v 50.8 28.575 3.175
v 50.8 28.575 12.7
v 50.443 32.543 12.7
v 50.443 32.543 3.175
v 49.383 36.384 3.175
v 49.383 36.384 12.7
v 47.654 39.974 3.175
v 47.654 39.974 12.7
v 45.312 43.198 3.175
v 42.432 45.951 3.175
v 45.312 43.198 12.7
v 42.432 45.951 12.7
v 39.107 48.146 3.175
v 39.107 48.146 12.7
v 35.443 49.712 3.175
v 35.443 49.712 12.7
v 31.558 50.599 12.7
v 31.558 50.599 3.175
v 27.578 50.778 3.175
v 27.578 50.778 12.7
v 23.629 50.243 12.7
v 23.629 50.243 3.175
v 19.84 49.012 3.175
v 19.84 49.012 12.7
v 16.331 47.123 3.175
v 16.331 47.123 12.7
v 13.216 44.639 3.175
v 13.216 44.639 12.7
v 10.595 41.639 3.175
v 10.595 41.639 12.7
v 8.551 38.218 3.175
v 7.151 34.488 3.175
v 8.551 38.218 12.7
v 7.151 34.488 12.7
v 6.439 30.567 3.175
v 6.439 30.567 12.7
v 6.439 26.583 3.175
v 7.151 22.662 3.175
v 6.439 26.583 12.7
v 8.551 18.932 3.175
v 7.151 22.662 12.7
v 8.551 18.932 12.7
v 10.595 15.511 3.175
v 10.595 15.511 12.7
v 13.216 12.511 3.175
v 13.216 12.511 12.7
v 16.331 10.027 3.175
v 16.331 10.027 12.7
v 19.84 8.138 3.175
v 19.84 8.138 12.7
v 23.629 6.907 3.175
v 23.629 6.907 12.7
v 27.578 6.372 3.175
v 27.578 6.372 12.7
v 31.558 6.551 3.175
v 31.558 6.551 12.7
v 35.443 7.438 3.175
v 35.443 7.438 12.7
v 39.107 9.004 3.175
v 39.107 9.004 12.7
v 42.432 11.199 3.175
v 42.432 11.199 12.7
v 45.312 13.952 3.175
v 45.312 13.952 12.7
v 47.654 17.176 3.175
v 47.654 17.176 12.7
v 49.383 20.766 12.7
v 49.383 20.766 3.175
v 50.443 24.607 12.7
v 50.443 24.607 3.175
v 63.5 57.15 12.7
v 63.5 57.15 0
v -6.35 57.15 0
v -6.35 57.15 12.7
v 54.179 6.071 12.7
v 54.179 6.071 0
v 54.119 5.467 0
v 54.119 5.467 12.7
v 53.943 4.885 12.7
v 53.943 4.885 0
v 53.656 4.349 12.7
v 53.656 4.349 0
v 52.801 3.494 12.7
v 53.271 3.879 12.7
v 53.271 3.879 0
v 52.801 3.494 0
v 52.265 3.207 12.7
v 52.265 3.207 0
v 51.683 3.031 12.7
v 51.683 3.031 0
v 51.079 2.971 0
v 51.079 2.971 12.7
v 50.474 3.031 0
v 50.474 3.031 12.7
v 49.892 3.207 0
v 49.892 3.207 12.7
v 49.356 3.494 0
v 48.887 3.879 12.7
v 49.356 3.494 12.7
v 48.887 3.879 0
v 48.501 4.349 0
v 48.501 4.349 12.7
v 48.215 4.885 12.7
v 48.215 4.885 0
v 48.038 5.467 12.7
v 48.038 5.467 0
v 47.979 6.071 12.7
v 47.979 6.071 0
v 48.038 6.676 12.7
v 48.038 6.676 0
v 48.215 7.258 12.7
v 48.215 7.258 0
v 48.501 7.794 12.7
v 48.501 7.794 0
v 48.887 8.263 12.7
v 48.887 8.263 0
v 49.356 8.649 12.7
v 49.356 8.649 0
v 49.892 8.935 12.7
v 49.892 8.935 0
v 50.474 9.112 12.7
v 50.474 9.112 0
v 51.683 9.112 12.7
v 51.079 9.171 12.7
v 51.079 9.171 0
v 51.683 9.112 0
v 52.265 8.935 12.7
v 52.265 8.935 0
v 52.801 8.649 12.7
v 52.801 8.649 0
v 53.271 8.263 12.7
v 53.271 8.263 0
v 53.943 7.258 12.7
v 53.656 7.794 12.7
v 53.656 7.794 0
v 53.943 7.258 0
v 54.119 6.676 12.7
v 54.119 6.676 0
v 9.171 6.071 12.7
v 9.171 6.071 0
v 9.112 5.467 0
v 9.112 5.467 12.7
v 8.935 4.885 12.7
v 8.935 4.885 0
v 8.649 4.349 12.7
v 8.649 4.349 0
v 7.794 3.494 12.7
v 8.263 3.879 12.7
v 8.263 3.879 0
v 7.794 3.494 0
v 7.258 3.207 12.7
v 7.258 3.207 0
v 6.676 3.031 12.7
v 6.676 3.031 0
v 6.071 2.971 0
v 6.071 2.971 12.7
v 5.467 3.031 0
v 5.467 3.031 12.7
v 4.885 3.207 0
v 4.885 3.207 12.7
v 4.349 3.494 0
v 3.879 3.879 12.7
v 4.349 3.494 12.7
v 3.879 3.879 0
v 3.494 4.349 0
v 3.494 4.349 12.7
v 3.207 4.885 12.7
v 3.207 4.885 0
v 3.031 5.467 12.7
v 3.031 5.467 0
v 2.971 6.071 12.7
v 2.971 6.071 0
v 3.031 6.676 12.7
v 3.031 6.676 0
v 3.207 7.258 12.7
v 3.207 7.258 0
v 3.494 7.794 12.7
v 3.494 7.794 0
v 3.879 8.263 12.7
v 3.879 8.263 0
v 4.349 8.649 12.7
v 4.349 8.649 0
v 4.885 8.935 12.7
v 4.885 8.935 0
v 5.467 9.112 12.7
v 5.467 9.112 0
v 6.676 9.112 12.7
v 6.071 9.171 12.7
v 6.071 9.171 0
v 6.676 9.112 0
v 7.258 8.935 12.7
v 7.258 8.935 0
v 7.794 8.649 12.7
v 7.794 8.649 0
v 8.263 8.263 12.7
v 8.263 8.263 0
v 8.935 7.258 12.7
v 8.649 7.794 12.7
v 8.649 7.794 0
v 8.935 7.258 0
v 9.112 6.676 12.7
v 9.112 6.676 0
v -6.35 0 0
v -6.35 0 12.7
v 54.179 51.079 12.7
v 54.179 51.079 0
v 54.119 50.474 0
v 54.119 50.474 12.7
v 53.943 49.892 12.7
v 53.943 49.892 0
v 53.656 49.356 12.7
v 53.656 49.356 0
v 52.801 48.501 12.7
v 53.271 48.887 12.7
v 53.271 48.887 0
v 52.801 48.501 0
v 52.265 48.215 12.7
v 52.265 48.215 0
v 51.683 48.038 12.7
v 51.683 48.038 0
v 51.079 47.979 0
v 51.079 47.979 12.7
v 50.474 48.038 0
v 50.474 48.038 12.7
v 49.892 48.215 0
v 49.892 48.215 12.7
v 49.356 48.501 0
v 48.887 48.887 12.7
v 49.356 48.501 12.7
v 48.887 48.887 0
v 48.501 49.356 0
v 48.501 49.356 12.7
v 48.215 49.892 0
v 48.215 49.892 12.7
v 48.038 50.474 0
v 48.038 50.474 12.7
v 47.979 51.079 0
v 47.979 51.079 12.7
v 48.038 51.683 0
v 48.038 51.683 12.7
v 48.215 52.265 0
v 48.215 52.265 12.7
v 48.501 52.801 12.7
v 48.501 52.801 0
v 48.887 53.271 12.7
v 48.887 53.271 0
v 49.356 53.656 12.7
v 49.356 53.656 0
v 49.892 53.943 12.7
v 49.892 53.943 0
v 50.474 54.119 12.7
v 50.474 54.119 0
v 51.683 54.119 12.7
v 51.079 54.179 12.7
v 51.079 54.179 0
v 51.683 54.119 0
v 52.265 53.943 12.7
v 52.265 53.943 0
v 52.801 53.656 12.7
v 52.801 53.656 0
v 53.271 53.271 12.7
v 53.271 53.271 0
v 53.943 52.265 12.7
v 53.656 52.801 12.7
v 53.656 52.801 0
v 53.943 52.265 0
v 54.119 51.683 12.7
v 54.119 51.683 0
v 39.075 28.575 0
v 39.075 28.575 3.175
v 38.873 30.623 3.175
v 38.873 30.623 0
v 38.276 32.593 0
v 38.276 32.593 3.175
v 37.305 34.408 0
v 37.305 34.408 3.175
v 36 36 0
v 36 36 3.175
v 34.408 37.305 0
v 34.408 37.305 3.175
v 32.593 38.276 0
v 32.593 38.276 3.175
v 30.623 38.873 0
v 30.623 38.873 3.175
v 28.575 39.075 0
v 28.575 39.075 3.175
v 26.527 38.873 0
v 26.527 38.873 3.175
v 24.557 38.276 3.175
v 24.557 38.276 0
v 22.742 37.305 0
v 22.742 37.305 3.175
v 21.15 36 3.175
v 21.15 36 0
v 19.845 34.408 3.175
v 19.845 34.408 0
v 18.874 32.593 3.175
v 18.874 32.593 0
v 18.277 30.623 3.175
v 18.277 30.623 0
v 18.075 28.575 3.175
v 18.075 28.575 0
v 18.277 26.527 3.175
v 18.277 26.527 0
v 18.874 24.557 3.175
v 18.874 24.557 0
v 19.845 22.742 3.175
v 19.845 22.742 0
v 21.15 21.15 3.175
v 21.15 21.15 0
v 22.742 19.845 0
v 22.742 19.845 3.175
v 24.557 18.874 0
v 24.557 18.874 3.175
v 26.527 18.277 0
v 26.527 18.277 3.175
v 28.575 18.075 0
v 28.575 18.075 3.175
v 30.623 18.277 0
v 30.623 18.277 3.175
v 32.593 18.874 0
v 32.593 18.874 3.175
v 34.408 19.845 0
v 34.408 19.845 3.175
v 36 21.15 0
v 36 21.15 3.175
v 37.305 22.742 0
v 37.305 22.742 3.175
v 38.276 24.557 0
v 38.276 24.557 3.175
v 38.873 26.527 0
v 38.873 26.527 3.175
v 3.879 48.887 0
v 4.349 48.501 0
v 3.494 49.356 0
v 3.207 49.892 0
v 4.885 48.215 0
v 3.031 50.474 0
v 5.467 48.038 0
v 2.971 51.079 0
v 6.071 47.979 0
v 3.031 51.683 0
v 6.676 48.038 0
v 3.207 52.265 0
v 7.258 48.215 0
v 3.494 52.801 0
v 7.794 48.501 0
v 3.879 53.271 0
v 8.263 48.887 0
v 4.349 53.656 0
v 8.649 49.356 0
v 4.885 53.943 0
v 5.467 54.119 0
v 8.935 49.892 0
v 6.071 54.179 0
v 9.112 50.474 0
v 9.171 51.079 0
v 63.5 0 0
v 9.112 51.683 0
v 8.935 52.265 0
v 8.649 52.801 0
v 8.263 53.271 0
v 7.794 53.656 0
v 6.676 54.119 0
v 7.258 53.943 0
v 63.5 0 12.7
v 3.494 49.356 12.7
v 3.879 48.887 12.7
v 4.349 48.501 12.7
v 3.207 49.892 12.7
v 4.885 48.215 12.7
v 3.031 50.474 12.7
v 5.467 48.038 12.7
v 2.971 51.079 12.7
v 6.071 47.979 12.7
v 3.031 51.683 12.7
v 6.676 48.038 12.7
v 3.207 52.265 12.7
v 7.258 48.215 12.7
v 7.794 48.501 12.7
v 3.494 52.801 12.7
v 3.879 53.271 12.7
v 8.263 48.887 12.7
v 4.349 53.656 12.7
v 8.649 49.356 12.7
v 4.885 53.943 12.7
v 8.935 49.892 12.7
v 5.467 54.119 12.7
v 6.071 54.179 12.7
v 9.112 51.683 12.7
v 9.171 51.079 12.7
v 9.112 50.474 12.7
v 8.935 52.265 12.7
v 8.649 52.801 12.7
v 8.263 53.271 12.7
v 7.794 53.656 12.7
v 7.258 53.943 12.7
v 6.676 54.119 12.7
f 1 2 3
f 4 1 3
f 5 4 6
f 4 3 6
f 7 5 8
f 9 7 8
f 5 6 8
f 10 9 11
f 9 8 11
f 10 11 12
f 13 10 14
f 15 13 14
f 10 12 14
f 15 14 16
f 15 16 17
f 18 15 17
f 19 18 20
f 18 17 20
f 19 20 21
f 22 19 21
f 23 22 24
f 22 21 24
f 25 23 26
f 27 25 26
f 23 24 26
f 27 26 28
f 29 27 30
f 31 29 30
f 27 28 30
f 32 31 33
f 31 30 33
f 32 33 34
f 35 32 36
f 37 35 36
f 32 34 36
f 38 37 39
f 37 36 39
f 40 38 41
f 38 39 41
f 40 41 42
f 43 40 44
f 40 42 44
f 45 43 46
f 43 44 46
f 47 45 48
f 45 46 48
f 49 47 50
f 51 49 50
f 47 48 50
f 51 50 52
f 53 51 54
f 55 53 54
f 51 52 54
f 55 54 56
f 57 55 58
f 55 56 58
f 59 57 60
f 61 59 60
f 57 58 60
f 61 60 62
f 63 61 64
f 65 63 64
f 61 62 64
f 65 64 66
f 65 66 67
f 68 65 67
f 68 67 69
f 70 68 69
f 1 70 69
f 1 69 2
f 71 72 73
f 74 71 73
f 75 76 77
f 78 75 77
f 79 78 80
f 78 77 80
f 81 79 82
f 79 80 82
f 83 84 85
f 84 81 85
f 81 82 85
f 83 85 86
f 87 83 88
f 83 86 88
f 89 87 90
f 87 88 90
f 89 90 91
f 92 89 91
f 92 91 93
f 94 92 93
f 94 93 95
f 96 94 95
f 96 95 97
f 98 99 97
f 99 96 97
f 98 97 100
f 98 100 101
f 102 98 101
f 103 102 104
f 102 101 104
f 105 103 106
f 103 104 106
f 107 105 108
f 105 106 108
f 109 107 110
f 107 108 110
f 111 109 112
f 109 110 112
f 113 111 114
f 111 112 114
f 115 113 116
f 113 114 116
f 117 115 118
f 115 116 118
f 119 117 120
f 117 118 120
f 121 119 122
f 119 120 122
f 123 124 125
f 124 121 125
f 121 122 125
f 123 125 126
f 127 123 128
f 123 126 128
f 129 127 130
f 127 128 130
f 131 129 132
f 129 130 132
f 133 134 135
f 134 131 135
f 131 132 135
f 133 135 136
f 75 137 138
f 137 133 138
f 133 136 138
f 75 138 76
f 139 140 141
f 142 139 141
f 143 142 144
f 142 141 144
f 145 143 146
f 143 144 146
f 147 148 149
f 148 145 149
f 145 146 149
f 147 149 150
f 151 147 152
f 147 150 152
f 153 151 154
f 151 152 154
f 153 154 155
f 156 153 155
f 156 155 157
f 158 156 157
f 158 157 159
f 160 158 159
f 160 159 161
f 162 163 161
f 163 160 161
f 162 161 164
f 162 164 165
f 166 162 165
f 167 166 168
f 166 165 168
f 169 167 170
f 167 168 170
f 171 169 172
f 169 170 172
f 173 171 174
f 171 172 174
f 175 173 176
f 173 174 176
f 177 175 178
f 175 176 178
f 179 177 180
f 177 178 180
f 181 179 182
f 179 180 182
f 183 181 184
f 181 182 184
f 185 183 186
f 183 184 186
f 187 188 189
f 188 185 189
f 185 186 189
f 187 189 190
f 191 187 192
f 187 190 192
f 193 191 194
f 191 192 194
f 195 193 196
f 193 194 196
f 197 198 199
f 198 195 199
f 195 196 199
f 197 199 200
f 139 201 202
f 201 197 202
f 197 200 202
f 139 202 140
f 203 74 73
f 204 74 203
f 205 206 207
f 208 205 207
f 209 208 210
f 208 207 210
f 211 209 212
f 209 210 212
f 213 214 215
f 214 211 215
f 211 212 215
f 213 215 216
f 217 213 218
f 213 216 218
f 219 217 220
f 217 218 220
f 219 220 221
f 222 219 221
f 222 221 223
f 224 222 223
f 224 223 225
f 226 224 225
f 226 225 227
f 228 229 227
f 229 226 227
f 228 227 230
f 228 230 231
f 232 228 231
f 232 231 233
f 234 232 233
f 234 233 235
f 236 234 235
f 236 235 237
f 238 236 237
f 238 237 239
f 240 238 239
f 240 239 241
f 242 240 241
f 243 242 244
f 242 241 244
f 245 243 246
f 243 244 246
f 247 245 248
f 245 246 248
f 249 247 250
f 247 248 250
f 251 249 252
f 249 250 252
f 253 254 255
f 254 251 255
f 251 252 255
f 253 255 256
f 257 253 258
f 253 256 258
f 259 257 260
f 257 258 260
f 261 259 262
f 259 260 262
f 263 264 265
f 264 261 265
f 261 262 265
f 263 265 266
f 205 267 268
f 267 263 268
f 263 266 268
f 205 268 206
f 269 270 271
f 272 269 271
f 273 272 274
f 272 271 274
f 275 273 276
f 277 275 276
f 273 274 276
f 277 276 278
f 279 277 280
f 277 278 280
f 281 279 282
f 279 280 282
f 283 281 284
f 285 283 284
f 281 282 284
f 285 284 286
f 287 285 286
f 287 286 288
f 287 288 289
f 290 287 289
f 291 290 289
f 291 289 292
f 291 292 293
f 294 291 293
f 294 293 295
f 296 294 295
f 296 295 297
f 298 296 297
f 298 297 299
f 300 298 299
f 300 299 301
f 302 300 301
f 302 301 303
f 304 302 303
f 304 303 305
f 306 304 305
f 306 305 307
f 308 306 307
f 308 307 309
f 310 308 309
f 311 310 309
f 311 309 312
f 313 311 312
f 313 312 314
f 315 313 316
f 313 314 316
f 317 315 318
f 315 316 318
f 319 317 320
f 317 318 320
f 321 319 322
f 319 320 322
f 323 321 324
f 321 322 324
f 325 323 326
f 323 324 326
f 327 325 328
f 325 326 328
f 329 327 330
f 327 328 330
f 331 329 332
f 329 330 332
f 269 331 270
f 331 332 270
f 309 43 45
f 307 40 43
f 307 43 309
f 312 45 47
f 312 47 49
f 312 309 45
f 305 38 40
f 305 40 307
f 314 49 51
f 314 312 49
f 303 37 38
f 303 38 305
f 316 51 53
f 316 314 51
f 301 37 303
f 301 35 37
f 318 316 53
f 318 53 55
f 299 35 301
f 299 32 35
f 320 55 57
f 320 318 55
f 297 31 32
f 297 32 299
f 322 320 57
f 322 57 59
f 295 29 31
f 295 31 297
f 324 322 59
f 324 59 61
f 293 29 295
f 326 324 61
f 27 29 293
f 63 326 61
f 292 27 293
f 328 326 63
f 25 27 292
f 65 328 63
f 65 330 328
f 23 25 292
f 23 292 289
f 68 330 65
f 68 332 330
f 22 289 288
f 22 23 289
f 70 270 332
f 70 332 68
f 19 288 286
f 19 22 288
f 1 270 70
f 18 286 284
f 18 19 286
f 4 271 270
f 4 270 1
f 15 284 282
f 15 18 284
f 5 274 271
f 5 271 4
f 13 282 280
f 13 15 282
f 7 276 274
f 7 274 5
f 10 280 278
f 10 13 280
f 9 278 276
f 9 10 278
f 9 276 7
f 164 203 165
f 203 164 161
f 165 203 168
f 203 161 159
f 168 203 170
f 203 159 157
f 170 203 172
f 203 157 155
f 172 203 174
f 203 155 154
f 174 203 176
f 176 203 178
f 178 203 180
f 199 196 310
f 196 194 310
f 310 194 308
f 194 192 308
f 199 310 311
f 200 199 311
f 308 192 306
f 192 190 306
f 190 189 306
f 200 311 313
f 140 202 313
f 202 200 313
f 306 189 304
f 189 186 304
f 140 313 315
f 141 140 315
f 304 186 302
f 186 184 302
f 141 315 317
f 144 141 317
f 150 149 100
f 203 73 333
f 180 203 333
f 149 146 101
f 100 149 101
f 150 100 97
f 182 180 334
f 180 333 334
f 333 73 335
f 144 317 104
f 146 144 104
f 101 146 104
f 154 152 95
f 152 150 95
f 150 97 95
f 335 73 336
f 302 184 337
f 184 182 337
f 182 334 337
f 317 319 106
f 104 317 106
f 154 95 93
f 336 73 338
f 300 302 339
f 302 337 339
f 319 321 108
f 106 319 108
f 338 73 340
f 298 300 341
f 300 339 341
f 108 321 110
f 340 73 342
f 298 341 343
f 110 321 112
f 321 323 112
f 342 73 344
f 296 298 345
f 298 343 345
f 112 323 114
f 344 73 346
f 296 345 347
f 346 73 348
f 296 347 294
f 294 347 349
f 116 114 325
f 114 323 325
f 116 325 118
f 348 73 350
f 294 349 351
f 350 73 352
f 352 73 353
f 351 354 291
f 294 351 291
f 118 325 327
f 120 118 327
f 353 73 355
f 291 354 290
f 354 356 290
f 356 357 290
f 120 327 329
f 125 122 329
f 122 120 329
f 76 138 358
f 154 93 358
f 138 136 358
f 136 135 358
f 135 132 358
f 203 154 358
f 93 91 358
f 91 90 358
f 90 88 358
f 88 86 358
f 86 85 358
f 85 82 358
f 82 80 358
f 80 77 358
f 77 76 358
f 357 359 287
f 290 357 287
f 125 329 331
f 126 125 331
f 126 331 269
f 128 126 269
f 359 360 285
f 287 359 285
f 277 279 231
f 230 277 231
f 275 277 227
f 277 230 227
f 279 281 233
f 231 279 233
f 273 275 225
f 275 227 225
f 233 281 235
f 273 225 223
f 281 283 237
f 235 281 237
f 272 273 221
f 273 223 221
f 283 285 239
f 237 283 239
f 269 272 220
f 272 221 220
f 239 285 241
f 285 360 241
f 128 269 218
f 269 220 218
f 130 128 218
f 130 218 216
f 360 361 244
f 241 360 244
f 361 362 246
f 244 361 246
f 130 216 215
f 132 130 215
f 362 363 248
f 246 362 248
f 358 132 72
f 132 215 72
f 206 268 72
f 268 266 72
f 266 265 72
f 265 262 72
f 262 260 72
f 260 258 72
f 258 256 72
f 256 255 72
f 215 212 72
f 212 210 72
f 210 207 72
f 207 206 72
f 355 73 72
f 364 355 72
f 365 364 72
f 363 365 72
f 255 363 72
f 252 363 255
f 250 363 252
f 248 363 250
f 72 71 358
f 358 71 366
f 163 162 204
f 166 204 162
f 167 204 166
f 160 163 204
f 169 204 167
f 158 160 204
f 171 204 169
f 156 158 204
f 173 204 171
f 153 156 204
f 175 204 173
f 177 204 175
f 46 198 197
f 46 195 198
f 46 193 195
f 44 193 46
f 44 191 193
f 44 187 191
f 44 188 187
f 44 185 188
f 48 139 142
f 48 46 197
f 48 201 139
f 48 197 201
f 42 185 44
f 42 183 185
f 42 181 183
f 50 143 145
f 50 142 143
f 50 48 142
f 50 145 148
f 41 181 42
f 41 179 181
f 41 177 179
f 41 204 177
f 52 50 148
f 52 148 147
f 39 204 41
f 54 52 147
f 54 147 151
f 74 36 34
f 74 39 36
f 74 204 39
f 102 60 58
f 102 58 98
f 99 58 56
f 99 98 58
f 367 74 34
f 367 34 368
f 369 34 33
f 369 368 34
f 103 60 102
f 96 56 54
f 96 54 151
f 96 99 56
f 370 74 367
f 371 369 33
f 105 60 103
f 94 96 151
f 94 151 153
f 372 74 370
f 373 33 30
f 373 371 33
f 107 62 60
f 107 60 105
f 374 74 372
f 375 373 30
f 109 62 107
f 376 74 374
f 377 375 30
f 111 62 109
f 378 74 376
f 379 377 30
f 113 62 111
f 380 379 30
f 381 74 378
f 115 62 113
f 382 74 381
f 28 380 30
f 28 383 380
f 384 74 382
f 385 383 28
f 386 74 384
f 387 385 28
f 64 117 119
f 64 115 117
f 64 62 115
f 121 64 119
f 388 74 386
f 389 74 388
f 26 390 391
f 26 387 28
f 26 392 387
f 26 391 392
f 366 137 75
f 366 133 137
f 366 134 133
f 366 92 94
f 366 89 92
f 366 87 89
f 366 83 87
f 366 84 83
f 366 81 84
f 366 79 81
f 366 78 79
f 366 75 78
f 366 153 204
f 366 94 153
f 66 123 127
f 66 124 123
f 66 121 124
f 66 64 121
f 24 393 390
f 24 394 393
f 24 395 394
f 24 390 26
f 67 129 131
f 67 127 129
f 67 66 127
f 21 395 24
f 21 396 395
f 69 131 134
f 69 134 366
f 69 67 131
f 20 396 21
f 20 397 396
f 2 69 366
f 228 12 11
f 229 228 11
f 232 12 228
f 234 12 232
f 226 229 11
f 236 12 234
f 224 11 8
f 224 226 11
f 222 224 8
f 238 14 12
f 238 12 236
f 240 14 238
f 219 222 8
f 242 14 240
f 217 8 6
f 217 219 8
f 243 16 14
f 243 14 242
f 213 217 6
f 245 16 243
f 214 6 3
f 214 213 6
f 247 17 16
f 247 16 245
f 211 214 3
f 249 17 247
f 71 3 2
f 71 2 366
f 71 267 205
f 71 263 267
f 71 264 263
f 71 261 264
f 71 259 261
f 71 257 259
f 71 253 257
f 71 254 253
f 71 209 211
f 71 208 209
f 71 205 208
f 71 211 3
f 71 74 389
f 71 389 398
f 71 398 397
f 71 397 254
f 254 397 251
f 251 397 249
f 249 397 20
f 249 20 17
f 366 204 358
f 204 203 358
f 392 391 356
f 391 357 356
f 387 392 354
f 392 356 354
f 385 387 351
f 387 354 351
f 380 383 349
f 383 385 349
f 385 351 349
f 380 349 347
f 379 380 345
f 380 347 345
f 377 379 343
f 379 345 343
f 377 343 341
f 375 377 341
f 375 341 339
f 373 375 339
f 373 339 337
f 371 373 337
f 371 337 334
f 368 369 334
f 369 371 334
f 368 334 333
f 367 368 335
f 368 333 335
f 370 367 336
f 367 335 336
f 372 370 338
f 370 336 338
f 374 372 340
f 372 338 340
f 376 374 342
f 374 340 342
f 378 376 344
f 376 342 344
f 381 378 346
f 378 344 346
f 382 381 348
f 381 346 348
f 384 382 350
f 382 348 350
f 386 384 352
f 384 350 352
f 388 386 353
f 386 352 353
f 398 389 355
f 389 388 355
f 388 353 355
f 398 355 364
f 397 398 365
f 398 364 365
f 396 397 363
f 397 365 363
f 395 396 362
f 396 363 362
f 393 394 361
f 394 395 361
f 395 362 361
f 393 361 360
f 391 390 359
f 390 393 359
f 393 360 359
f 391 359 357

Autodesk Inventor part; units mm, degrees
ref_plane "YZ Plane" through (0, 0, 0) normal (1, 0, 0) x (0, 1, 0)
ref_plane "XZ Plane" through (0, 0, 0) normal (0, 1, 0) x (-1, 0, 0)
ref_plane "XY Plane" through (0, 0, 0) normal (0, 0, 1) x (1, 0, 0)
sketch "Sketch1" plane through (0, 0, 0) normal (0, 0, 1) x (1, 0, 0)
  line L0 (0, 0) -> (57.15, 0)
  line L1 (57.15, 0) -> (57.15, 57.15)
  line L2 (57.15, 57.15) -> (0, 57.15)
  line L3 (0, 57.15) -> (0, 0)
  line L4 (0, 57.15) -> (57.15, 0) construction
  circle A0 centre (28.575, 28.575) radius 31.825 construction
  line L5 (0, 0) -> (57.15, 57.15) construction
  circle A1 centre (6.0713, 51.0787) radius 3.1
  circle A2 centre (6.0713, 6.0713) radius 3.1
  circle A3 centre (51.0787, 6.0713) radius 3.1
  circle A4 centre (51.0787, 51.0787) radius 3.1
  circle A5 centre (28.575, 28.575) radius 11.1125
  dimension "d2" = 63.65
  dimension "d0" = 57.15
  dimension "d1" = 57.15
  dimension "d3" = 6.2
  dimension "d6" = 360
  dimension "d10" = 22.225
extrude "Extrusion1" add sketch "Sketch1" along normal blind 12.7 contours L3 L2 L1 L0 | A5
sketch "Sketch2" plane through (0, 0, 12.7) normal (0, 0, 1) x (1, 0, 0)
  circle A0 centre (28.575, 28.575) radius 10.5
  line L0 (57.15, 57.15) -> (0, 57.15) projected
  line L1 (57.15, 0) -> (57.15, 57.15) projected
  point P0 (0, 0)
  dimension "d11" = 21
  dimension "d12" = 28.575
  dimension "d13" = 28.575
extrude "Extrusion2" cut sketch "Sketch2" against normal blind 25.4
sketch "Sketch3" plane through (0, 0, 12.7) normal (0, 0, 1) x (1, 0, 0)
  circle A0 centre (28.575, 28.575) radius 10.5 projected
  circle A1 centre (28.575, 28.575) radius 22.225
  point P0 (0, 0)
  dimension "d16" = 44.45
extrude "Extrusion3" cut sketch "Sketch3" against normal blind 9.525
sketch "Sketch4" plane through (0, 0, 12.7) normal (0, 0, 1) x (1, 0, 0)
  line L0 (0, 57.15) -> (0, 0) projected
  line L1 (0, 57.15) -> (-6.35, 57.15)
  line L2 (-6.35, 57.15) -> (-6.35, 0)
  line L3 (-6.35, 0) -> (0, 0)
  line L4 (0, 0) -> (0, 57.15)
  line L5 (57.15, 0) -> (57.15, 57.15) projected
  line L6 (57.15, 57.15) -> (63.5, 57.15)
  line L7 (63.5, 57.15) -> (63.5, 0)
  line L8 (63.5, 0) -> (57.15, 0)
  line L9 (57.15, 0) -> (57.15, 57.15)
  dimension "d19" = 6.35
  dimension "d20" = 6.35
extrude "Extrusion4" add sketch "Sketch4" against normal up to surface (12.7 mm away)
sketch "Sketch5" plane through (0, 0, 12.7) normal (0, 0, 1) x (1, 0, 0)
  circle A0 centre (28.575, 28.575) radius 10.5 projected
  circle A1 centre (51.0787, 6.0713) radius 3.1 projected
  circle A2 centre (28.575, 28.575) radius 31.825
  point P0 (0, 0)
properties part number "polycarb_front" material "Polycarbonate, Smoke"
